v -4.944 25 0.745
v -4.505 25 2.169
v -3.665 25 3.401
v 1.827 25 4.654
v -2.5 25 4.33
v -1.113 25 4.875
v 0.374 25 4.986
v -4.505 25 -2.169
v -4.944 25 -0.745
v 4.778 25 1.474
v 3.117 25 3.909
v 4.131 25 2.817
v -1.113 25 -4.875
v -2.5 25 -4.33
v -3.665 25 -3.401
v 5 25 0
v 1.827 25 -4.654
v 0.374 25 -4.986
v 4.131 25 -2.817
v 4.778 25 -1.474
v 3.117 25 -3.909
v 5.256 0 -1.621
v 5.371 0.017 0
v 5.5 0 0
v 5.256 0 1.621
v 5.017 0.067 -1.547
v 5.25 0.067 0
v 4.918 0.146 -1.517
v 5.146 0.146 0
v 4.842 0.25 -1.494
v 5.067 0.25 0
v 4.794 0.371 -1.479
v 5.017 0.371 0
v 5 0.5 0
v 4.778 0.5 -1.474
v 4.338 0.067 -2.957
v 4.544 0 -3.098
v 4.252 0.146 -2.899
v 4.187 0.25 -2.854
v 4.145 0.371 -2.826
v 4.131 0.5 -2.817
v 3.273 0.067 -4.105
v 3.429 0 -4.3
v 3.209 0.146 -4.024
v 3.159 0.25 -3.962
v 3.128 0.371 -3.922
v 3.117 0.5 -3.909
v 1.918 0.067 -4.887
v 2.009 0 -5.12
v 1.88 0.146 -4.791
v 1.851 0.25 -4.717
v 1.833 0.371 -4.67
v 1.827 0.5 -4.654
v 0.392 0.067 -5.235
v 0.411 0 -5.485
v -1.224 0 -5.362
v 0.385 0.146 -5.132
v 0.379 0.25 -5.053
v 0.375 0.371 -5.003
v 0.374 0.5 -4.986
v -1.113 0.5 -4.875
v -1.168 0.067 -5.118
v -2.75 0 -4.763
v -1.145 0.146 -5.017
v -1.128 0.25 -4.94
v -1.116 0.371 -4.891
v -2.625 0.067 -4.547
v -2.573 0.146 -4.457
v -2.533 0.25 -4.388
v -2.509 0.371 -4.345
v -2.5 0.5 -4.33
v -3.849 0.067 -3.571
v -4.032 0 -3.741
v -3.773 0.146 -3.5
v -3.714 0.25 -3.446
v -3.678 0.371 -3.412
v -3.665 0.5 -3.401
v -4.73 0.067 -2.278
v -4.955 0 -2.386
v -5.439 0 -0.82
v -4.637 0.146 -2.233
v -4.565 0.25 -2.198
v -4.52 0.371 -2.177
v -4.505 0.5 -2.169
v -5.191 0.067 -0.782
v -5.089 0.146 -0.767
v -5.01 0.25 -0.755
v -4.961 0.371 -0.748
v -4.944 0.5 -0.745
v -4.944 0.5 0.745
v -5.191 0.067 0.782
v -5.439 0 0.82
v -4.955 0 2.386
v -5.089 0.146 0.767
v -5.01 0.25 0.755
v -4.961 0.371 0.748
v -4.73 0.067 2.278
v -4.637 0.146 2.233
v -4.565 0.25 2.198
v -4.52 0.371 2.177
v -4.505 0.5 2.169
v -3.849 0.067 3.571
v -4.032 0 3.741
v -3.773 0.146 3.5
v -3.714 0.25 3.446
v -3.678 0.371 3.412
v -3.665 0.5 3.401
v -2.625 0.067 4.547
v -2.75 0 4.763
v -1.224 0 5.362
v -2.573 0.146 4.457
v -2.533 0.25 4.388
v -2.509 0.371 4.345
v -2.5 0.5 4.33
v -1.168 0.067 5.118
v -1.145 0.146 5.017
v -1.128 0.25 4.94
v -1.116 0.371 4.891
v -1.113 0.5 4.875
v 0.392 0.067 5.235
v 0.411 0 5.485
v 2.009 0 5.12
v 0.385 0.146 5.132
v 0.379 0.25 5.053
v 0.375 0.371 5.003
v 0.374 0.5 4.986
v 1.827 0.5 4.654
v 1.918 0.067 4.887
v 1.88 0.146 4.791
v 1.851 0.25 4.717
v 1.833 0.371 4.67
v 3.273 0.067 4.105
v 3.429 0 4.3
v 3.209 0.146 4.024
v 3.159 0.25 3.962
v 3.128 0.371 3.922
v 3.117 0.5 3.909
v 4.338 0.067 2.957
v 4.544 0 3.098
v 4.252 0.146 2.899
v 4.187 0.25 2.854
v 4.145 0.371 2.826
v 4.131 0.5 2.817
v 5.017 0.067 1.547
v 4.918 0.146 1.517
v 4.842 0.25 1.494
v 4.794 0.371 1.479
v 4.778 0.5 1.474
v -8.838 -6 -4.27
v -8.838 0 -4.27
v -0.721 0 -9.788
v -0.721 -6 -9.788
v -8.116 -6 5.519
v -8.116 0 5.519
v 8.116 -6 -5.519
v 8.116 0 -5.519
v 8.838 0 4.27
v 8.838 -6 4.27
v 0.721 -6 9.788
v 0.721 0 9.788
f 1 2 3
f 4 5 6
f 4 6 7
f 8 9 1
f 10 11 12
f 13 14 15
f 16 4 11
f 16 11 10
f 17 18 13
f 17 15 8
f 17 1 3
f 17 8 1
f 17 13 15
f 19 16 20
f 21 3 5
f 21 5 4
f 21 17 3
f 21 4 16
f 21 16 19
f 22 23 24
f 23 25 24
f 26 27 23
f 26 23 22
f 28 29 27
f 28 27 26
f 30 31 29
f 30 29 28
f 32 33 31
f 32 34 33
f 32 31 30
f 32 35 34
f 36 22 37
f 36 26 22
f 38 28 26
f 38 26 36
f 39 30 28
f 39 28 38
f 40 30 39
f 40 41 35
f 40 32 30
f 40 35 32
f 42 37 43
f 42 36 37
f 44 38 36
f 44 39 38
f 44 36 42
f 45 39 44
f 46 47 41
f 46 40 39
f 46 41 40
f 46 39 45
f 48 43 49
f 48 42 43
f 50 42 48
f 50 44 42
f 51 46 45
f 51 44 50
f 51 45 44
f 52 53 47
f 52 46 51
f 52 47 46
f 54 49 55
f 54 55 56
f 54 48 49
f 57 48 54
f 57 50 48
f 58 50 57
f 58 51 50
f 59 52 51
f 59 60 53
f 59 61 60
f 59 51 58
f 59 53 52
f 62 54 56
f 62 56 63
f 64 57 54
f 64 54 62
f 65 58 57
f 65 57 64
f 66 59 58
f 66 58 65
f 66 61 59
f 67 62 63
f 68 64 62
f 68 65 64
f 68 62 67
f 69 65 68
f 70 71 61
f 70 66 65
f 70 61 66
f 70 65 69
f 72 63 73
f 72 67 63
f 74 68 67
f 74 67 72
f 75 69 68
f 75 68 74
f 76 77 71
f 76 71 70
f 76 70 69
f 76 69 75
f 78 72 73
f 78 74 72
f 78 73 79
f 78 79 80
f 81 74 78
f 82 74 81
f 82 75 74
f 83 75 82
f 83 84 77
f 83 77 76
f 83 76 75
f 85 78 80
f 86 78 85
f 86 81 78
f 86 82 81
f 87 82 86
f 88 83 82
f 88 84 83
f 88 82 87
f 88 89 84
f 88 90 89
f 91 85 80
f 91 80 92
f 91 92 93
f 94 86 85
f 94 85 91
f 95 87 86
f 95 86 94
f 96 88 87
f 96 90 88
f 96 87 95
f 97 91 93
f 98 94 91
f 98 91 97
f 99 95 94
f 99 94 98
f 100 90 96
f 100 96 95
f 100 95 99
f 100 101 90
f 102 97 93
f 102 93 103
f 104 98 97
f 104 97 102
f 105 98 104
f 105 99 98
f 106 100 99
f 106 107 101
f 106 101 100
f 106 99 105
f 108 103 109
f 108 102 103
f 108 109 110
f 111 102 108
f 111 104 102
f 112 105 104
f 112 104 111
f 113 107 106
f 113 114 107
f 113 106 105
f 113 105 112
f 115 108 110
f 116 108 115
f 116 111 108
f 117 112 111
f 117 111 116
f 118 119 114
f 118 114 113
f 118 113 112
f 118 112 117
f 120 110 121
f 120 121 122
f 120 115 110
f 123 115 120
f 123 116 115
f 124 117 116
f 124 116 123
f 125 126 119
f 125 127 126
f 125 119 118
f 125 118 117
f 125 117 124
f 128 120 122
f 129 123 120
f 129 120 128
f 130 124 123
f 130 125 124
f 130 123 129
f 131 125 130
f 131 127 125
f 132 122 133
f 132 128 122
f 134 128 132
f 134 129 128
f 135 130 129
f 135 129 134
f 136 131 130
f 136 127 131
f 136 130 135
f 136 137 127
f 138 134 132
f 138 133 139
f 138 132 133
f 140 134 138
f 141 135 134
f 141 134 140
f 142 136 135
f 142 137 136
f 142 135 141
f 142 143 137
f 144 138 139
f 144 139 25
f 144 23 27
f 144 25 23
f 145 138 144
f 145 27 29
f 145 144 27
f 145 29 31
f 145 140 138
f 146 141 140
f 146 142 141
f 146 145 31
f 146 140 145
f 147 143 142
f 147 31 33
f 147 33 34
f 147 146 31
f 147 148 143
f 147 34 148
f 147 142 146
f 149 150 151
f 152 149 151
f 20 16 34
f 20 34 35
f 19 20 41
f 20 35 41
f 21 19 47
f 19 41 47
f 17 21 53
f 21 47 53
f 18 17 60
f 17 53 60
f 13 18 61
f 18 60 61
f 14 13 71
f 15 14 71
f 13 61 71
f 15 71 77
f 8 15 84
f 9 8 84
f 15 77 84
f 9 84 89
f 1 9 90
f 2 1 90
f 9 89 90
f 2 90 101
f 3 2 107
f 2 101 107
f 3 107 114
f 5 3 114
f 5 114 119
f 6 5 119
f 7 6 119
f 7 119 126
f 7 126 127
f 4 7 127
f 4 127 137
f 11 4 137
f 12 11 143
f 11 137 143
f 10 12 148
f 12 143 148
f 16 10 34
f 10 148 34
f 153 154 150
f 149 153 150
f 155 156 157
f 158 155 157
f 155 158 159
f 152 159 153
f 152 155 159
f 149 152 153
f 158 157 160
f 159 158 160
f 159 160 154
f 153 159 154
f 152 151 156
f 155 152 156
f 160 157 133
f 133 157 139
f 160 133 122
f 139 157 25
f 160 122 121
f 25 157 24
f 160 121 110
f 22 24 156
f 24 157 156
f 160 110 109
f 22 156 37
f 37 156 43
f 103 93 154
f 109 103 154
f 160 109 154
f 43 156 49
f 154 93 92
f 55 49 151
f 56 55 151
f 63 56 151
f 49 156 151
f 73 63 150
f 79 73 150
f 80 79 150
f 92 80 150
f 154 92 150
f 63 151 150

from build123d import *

# Parameters (mm, degrees)
SZKIC1_R                    = 5
DODANIE_WYCI_GNI_CIE1_DEPTH = 25
DODANIE_WYCI_GNI_CIE2_DEPTH = 6
ZAOKR_GLENIE1_R             = 0.5


with BuildPart() as part:
    # Szkic1 → Dodanie-wyciągnięcie1 (new body)
    with BuildSketch(Plane(origin=(0, 0, 0), x_dir=(1, 0, 0), z_dir=(0, 1, 0))):
        Circle(SZKIC1_R)
    extrude(amount=DODANIE_WYCI_GNI_CIE1_DEPTH)

    # Szkic2 → Dodanie-wyciągnięcie2 (add)
    with BuildSketch(Plane(origin=(0, 0, 0), x_dir=(-1, 0, 0), z_dir=(0, -1, 0))):
        Polygon((-0.721110691, -9.78842851), (8.116472407, -5.518714433), (8.837583099, 4.269714077), (0.721110691, 9.78842851), (-8.116472407, 5.518714433), (-8.837583099, -4.269714077), align=None)
    extrude(amount=DODANIE_WYCI_GNI_CIE2_DEPTH)

    # Zaokrąglenie1
    zaokr_glenie1_edges = [part.edges().sort_by_distance(p)[0] for p in [
        (-5, 0, 0),
    ]]
    fillet(zaokr_glenie1_edges, radius=ZAOKR_GLENIE1_R)


solid = part.part
